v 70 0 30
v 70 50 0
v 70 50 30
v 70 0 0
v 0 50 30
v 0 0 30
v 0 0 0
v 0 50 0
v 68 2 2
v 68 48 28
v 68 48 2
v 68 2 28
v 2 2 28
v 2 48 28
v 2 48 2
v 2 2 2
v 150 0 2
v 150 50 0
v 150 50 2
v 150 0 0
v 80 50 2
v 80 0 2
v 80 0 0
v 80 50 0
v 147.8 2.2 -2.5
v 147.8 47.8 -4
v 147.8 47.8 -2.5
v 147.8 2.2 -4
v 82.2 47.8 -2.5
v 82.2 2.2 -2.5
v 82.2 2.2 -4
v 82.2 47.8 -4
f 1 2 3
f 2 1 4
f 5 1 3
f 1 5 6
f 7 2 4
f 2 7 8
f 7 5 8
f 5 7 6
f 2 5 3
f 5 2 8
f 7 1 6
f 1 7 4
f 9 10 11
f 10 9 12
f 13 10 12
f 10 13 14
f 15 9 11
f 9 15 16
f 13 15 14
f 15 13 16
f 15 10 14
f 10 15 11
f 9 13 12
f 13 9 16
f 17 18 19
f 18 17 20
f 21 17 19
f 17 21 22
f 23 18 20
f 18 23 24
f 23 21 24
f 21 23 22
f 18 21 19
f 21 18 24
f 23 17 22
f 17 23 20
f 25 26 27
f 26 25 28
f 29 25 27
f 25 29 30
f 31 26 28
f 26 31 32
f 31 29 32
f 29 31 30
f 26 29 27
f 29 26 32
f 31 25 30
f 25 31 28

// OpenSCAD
// Two-part enclosure for electronics board.
// Part 1: Box (left) - 70x50x30mm outer, 2mm walls/floor, open top.
// Part 2: Lid (right) - 70x50x2mm plate with 4mm tall lip (1.5mm wall), 65.6x45.6mm outer lip.
// Parts are side-by-side with a 10mm gap. Lid is printed upside down (lip facing down) to slide in.

// Dimensions
BOX_X  = 70;
BOX_Y  = 50;
BOX_Z  = 30;
WALL   = 2;
FLOOR  = 2;

LID_PLATE_X = 70;
LID_PLATE_Y = 50;
LID_PLATE_Z = 2;

LIP_WALL_THICKNESS = 1.5;
LIP_HEIGHT = 4;
LIP_OUT_X = 65.6;
LIP_OUT_Y = 45.6;

// Gap between parts
GAP = 10;

// Derived dimensions for the box
BOX_IN_X = BOX_X - 2 * WALL;
BOX_IN_Y = BOX_Y - 2 * WALL;
BOX_IN_Z = BOX_Z - FLOOR; // Open top, so height is just wall + floor

// Derived dimensions for the lid lip
// Lip outer size is 65.6 x 45.6. Plate is 70 x 50.
// Clearance = (70 - 65.6) / 2 = 2.2 mm total, 1.1 mm each side.
// Clearance = (50 - 45.6) / 2 = 2.2 mm total, 1.1 mm each side.
// The prompt asks for 0.2mm clearance. Let's re-read carefully.
// "whose outer size is 65.6 x 45.6 mm... so it slides into the box opening with 0.2 mm clearance on each side."
// Box opening is 66 x 46 (70-2*2, 50-2*2).
// Lip outer is 65.6 x 45.6.
// Gap between Lip Outer and Box Inner = (66 - 65.6) / 2 = 0.2 mm. Correct.

$fn = 64;

// --- Part 1: The Box ---
// Constructed by extruding a 2D profile.
// Profile: Bottom wall (FLOOR), Side walls (WALL), Top opening.
// We build the solid block and subtract the empty space inside.

difference() {
    // Main block
    translate([0, 0, 0]) 
        cube([BOX_X, BOX_Y, BOX_Z]);
    
    // Cut out the empty interior
    // Interior dimensions:
    // X: from WALL to BOX_X - WALL
    // Y: from WALL to BOX_Y - WALL
    // Z: from FLOOR to BOX_Z - WALL (since top is open)
    
    translate([WALL, WALL, FLOOR]) 
        cube([BOX_IN_X, BOX_IN_Y, BOX_IN_Z - WALL]);
}

// --- Part 2: The Lid ---
// Constructed as a plate with a lip.
// The lid is printed upside down relative to the box opening, meaning the lip faces the box.
// However, the prompt says "Place the lid on the +X side of the box".
// If the lid is printed "upside down" (lip facing down), and placed on +X, it will sit next to the box.
// To slide it in, the user would flip it over after printing, or the design implies the lip is the bottom surface.
// Given "printed upside down: a plate ... with a rectangular lip on top of it", this phrasing is slightly ambiguous.
// Usually, "printed upside down" means the part is inverted in Z.
// Let's interpret: The physical part has a plate and a lip. The lip is 4mm tall.
// If printed normally, lip is up. If printed upside down, lip is down.
// To slide into the box (which has an open top), the lip must be the bottom surface of the lid assembly.
// So we model the lid with the lip extending downwards from the plate.

module lid() {
    // Plate base
    translate([0, 0, 0]) 
        cube([LID_PLATE_X, LID_PLATE_Y, LID_PLATE_Z]);
    
    // Lip
    // The lip is on the plate. If printed upside down, the lip extends in -Z direction.
    // Lip outer size: 65.6 x 45.6.
    // Lip thickness: 1.5.
    // Lip height: 4.
    // Centered on the plate.
    
    translate([
        (LID_PLATE_X - LIP_OUT_X) / 2,
        (LID_PLATE_Y - LIP_OUT_Y) / 2,
        -LIP_HEIGHT // Extend downwards
    ]) 
        cube([LIP_OUT_X, LIP_OUT_Y, LIP_WALL_THICKNESS]);
}

// --- Assembly ---
// Place Box at origin.
// Place Lid on +X side with GAP.
// Lid is placed such that its lip faces the box (downwards in Z relative to the lid's local frame if we consider the plate as top, but here we built the lip down).
// Since we built the lip down from the plate, and we place the lid next to the box, the lip will be adjacent to the box opening.

translate([0, 0, 0])
    difference() {
        // Box
        translate([0, 0, 0]) 
            cube([BOX_X, BOX_Y, BOX_Z]);
        
        // Interior of box
        translate([WALL, WALL, FLOOR]) 
            cube([BOX_IN_X, BOX_IN_Y, BOX_IN_Z - WALL]);
    }

translate([BOX_X + GAP, 0, 0])
    lid();
